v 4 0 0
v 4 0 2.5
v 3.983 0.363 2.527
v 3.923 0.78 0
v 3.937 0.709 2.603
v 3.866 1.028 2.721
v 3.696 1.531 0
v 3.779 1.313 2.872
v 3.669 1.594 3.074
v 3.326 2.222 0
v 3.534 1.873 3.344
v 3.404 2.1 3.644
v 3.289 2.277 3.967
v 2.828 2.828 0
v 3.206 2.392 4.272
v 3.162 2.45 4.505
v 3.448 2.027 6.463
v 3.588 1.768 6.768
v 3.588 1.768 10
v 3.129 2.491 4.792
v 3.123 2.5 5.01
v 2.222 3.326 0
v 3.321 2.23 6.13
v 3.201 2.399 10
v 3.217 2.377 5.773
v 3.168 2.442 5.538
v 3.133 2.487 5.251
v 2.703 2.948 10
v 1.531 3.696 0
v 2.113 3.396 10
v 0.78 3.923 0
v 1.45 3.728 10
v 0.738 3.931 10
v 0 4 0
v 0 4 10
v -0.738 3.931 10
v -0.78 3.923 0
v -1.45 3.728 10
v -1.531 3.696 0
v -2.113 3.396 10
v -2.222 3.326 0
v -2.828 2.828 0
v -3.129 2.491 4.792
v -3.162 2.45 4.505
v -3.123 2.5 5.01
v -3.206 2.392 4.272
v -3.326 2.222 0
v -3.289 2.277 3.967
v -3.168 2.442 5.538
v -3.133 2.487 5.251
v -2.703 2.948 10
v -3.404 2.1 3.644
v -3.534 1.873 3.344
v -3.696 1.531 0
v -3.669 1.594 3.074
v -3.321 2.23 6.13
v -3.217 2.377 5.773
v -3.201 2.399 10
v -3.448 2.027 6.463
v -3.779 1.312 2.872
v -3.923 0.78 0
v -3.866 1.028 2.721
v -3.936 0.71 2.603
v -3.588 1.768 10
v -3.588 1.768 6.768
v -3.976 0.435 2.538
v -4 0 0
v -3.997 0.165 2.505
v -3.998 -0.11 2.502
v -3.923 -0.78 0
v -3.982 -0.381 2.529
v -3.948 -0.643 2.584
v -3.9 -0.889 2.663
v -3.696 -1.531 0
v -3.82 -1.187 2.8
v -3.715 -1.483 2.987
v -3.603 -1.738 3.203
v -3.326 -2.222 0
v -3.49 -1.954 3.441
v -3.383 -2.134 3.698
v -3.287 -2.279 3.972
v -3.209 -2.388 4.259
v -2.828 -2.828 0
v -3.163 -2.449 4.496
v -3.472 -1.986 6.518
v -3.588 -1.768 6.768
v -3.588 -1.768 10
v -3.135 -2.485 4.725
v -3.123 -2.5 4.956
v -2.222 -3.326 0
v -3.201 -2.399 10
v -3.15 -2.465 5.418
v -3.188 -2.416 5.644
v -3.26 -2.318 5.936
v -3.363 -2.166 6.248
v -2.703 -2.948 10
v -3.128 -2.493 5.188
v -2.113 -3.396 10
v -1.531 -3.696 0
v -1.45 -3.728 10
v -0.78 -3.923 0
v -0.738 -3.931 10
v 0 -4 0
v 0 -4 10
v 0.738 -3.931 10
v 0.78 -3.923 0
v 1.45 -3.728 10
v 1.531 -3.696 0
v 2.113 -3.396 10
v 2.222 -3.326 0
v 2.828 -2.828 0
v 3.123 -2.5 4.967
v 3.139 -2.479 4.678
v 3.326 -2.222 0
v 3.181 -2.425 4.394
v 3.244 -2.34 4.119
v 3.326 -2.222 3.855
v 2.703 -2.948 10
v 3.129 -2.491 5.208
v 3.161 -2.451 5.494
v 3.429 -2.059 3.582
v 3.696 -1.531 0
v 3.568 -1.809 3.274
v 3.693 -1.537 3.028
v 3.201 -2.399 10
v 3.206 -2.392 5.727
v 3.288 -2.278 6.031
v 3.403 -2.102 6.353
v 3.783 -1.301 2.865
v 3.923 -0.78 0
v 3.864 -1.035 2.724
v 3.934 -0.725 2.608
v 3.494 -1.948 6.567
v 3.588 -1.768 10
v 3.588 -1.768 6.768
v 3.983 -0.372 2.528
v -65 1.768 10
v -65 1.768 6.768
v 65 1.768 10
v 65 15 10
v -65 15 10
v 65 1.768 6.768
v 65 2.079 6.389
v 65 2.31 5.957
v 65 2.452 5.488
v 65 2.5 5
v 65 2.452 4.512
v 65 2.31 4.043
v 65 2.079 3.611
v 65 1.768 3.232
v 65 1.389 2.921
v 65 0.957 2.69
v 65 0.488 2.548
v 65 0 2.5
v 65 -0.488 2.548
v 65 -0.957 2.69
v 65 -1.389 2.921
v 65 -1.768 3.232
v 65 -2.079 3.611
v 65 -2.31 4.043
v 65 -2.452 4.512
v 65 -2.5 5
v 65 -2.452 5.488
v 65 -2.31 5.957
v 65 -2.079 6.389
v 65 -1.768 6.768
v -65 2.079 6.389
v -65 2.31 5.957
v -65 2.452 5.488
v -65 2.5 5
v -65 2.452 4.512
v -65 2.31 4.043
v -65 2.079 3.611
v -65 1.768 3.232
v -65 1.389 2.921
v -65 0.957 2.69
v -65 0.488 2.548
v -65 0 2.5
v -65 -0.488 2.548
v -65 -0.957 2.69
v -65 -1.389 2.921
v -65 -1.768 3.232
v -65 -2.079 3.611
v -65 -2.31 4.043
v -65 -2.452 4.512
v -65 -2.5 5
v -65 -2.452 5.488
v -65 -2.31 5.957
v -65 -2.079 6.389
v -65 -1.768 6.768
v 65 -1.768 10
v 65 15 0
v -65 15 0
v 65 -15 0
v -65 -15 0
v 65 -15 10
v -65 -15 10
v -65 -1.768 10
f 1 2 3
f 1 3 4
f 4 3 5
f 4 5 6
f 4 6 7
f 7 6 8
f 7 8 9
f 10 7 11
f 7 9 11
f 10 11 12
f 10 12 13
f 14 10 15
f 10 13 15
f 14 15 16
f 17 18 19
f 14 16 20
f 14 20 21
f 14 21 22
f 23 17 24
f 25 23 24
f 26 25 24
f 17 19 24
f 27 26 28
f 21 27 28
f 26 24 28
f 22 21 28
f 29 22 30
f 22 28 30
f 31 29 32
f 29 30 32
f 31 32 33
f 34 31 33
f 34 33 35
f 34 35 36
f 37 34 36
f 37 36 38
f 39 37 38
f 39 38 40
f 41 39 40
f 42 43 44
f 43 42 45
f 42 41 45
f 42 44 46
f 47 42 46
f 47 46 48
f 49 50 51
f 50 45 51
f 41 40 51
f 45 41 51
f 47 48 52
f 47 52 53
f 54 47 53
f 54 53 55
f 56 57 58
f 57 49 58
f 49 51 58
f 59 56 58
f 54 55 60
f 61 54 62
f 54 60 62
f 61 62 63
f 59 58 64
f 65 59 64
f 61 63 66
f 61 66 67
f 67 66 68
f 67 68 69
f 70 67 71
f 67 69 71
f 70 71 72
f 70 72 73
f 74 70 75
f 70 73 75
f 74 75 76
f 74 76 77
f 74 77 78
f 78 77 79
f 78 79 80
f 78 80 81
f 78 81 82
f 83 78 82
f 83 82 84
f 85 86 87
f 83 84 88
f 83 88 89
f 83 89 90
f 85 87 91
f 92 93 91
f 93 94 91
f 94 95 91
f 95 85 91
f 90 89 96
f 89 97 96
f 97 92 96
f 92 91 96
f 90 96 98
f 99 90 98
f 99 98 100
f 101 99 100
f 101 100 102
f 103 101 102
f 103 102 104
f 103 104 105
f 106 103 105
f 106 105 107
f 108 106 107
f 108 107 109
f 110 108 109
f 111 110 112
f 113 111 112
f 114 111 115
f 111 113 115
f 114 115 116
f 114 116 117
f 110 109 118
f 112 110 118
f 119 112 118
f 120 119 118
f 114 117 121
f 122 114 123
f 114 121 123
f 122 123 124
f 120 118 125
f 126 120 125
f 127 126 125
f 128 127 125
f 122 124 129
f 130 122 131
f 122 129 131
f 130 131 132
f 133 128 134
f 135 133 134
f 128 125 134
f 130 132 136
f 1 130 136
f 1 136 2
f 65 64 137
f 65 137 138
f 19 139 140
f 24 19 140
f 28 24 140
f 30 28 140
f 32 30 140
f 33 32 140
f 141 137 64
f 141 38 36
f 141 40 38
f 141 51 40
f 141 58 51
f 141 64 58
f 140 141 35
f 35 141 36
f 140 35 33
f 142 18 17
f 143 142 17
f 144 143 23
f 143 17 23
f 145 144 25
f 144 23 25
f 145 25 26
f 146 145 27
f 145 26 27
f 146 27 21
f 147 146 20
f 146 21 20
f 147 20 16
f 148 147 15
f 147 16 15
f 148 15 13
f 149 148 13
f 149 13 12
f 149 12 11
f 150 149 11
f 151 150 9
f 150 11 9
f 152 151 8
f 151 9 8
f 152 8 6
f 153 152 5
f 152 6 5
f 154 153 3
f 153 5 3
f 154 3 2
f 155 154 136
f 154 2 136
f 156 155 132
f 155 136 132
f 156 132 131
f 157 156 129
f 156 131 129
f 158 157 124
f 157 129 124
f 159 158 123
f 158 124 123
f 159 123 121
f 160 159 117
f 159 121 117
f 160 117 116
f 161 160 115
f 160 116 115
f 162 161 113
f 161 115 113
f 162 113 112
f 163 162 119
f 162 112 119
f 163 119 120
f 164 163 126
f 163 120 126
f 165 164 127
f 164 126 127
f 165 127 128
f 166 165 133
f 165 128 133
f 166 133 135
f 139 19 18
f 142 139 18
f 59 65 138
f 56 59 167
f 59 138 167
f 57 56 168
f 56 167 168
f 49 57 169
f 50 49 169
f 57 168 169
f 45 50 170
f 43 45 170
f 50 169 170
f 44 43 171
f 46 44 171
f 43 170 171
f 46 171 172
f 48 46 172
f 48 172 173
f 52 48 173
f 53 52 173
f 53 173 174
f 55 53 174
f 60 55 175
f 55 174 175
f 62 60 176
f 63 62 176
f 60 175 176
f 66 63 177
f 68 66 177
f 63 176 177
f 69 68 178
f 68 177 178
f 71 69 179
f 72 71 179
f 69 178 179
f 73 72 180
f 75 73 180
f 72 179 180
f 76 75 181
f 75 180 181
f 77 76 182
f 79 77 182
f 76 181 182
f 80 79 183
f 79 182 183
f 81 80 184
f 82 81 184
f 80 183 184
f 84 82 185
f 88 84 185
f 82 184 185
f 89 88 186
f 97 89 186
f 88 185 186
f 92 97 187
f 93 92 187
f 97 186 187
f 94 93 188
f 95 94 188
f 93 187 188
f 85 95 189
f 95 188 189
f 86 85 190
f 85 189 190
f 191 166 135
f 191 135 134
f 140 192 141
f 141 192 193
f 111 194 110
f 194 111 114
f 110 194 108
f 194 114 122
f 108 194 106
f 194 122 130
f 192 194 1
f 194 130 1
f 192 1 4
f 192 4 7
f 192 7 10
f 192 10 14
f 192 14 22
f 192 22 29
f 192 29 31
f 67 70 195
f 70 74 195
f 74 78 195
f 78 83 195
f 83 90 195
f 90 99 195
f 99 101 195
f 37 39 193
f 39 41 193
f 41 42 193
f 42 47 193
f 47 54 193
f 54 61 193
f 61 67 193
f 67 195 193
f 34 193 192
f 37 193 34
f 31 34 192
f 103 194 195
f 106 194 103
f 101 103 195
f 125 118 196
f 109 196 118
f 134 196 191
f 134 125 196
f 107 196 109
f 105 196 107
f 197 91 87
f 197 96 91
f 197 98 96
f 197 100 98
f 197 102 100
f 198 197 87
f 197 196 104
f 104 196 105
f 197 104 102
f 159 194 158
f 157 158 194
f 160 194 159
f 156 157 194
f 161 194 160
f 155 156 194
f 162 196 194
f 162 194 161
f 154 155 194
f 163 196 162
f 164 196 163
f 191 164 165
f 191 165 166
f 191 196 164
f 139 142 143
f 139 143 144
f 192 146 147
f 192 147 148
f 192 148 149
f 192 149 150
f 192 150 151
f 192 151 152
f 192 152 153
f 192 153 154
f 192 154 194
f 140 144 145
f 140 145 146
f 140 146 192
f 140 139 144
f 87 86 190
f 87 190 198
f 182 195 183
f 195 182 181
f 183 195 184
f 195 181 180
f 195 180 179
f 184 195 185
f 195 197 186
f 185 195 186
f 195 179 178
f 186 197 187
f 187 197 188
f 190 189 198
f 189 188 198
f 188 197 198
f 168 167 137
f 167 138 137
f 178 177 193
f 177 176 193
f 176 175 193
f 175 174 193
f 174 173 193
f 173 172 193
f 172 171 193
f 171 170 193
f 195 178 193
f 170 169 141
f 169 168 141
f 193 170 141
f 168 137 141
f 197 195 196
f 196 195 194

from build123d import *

# Parameters (mm, degrees)
SKETCH_1_R           = 4
SKETCH_1_R_2         = 15
EXTRUDE_2_DEPTH      = 10
SKETCH_2_W           = 48
SKETCH_2_H           = 4
CUT_EXTRUDE_3_DEPTH  = 68.453687816
CUT_EXTRUDE_4_DEPTH  = 68.453687816
SKETCH_4_W           = 48
SKETCH_4_H           = 4
EXTRUDE_3_DEPTH      = 10
SKETCH_5_W           = 10
SKETCH_5_H           = 4
EXTRUDE_4_DEPTH      = 100
SKETCH_6_W           = 15
SKETCH_6_H           = 10
CUT_EXTRUDE_5_DEPTH  = 100
SKETCH_7_R           = 2.5
CUT_EXTRUDE_14_DEPTH = 117.404467268
SKETCH_11_R          = 4
CUT_EXTRUDE_15_DEPTH = 68.45368795
SKETCH_12_R          = 15
EXTRUDE_5_DEPTH      = 10
SKETCH_14_W          = 100
SKETCH_14_H          = 10
EXTRUDE_6_DEPTH      = 30
SKETCH_15_R          = 2.5
CUT_EXTRUDE_16_DEPTH = 117.40446729
SKETCH_16_R          = 4
CUT_EXTRUDE_17_DEPTH = 68.45368795
SKETCH_17_W          = 15
SKETCH_17_H          = 30
EXTRUDE_7_DEPTH      = 10
SKETCH_18_R          = 2.5
CUT_EXTRUDE_18_DEPTH = 132.244047492
CUT_EXTRUDE_19_DEPTH = 132.244047591


with BuildPart() as part:
    # 草图1 → 凸台-拉伸2 (new body)
    # profile 1 of 3: a face of its own
    with BuildSketch(Plane.XY):
        with BuildLine():
            Line((50.00000004, 15), (-50, 15))
            ThreePointArc((-50, 15), (-39.393398282, 10.606601718), (-35, 0))
            ThreePointArc((-35, 0), (-39.393398282, -10.606601718), (-50, -15))
            Line((-50, -15), (50, -15))
            ThreePointArc((50, -15), (35, 2e-08), (50.00000004, 15))
        make_face()
        Circle(SKETCH_1_R, mode=Mode.SUBTRACT)
    # profile 2 of 3: a face of its own
    with BuildSketch(Plane.XY):
        with Locations((-50, 0)):
            Circle(SKETCH_1_R_2)
    # profile 3 of 3: a face of its own
    with BuildSketch(Plane.XY):
        with Locations((50, 0)):
            Circle(SKETCH_1_R_2)
    extrude(amount=EXTRUDE_2_DEPTH)

    # 草图2 → 切除-拉伸3 (cut, through all)
    with BuildSketch(Plane.XY.offset(10)):
        with Locations((26, 10)):
            Rectangle(SKETCH_2_W, SKETCH_2_H)
        with Locations((-26, 10)):
            Rectangle(SKETCH_2_W, SKETCH_2_H)
        with Locations((-26, -10)):
            Rectangle(SKETCH_2_W, SKETCH_2_H)
        with Locations((26, -10)):
            Rectangle(SKETCH_2_W, SKETCH_2_H)
    extrude(amount=-CUT_EXTRUDE_3_DEPTH, mode=Mode.SUBTRACT)

    # 草图3 → 切除-拉伸4 (cut, through all)
    with BuildSketch(Plane.XY.offset(10)):
        with BuildLine():
            Line((-3.464101615, 2), (-50, 2))
            Line((-50, 2), (-50, 0))
            Line((-50, 0), (-4, 0))
            ThreePointArc((-4, 0), (-3.863703305, 1.03527618), (-3.464101615, 2))
        make_face()
        with BuildLine():
            Line((-4, 0), (-50, 0))
            Line((-50, 0), (-50, -2))
            Line((-50, -2), (-3.464101615, -2))
            ThreePointArc((-3.464101615, -2), (-3.863703305, -1.03527618), (-4, 0))
        make_face()
        with BuildLine():
            Line((50, 0), (4, 0))
            ThreePointArc((4, 0), (3.863703305, -1.03527618), (3.464101615, -2))
            Line((3.464101615, -2), (50, -2))
            Line((50, -2), (50, 0))
        make_face()
        with BuildLine():
            Line((50, 2), (3.464101615, 2))
            ThreePointArc((3.464101615, 2), (3.863703305, 1.03527618), (4, 0))
            Line((4, 0), (50, 0))
            Line((50, 0), (50, 2))
        make_face()
    extrude(amount=-CUT_EXTRUDE_4_DEPTH, mode=Mode.SUBTRACT)

    # 草图4 → 凸台-拉伸3 (add)
    with BuildSketch(Plane.XY.offset(10)):
        with Locations((26, 10)):
            Rectangle(SKETCH_4_W, SKETCH_4_H)
        with Locations((26, -10)):
            Rectangle(SKETCH_4_W, SKETCH_4_H)
        with Locations((-26, 10)):
            Rectangle(SKETCH_4_W, SKETCH_4_H)
        with Locations((-26, -10)):
            Rectangle(SKETCH_4_W, SKETCH_4_H)
    extrude(amount=-EXTRUDE_3_DEPTH)

    # 草图5 → 凸台-拉伸4 (add)
    with BuildSketch(Plane(origin=(-50, 0, 0), x_dir=(0, 0, -1), z_dir=(1, 0, 0))):
        with Locations((-5, 0)):
            Rectangle(SKETCH_5_W, SKETCH_5_H)
    extrude(amount=EXTRUDE_4_DEPTH)

    # 草图6 → 切除-拉伸5 (cut)
    with BuildSketch(Plane.XZ.offset(15)):
        with Locations((-57.5, 5)):
            Rectangle(SKETCH_6_W, SKETCH_6_H)
    extrude(amount=-CUT_EXTRUDE_5_DEPTH, mode=Mode.SUBTRACT)

    # 草图7 → 切除-拉伸14 (cut, through all)
    with BuildSketch(Plane.ZY.offset(50)):
        with Locations((5, 0)):
            Circle(SKETCH_7_R)
    extrude(amount=-CUT_EXTRUDE_14_DEPTH, mode=Mode.SUBTRACT)

    # 草图11 → 切除-拉伸15 (cut, through all)
    with BuildSketch(Plane.XY.offset(10)):
        Circle(SKETCH_11_R)
    extrude(amount=-CUT_EXTRUDE_15_DEPTH, mode=Mode.SUBTRACT)

    # 草图12 → 凸台-拉伸5 (add)
    with BuildSketch(Plane.XY.offset(10)):
        with Locations((-50, 0)):
            Circle(SKETCH_12_R)
    extrude(amount=-EXTRUDE_5_DEPTH)

    # 草图14 → 凸台-拉伸6 (add)
    with BuildSketch(Plane(origin=(0, 15, 0), x_dir=(1, 0, 0), z_dir=(0, 1, 0))):
        with Locations((0, -5)):
            Rectangle(SKETCH_14_W, SKETCH_14_H)
    extrude(amount=-EXTRUDE_6_DEPTH)

    # 草图15 → 切除-拉伸16 (cut, through all)
    with BuildSketch(Plane(origin=(50, 0, 0), x_dir=(0, 0, -1), z_dir=(1, 0, 0))):
        with Locations(Location((-5, 0, 0), (0, 0, 180))):
            Circle(SKETCH_15_R)
    extrude(amount=-CUT_EXTRUDE_16_DEPTH, mode=Mode.SUBTRACT)

    # 草图16 → 切除-拉伸17 (cut, through all)
    with BuildSketch(Plane.XY.offset(10)):
        Circle(SKETCH_16_R)
    extrude(amount=-CUT_EXTRUDE_17_DEPTH, mode=Mode.SUBTRACT)

    # 草图17 → 凸台-拉伸7 (add)
    with BuildSketch(Plane.XY.offset(10)):
        with Locations((57.5, 0)):
            Rectangle(SKETCH_17_W, SKETCH_17_H)
        with Locations((-57.5, 0)):
            Rectangle(SKETCH_17_W, SKETCH_17_H)
    extrude(amount=-EXTRUDE_7_DEPTH)

    # 草图18 → 切除-拉伸18 (cut, through all)
    with BuildSketch(Plane.ZY.offset(65)):
        with Locations((5, 0)):
            Circle(SKETCH_18_R)
    extrude(amount=-CUT_EXTRUDE_18_DEPTH, mode=Mode.SUBTRACT)

    # 草图19 → 切除-拉伸19 (cut, through all)
    with BuildSketch(Plane.ZY.offset(65)):
        with BuildLine():
            Line((10, 1.767766953), (6.767766953, 1.767766953))
            ThreePointArc((6.767766953, 1.767766953), (7.309698831, 0.956708581), (7.5, 0))
            ThreePointArc((7.5, 0), (7.309698831, -0.956708581), (6.767766953, -1.767766953))
            Line((6.767766953, -1.767766953), (10, -1.767766953))
            Line((10, -1.767766953), (10, 1.767766953))
        make_face()
    extrude(amount=-CUT_EXTRUDE_19_DEPTH, mode=Mode.SUBTRACT)


solid = part.part
